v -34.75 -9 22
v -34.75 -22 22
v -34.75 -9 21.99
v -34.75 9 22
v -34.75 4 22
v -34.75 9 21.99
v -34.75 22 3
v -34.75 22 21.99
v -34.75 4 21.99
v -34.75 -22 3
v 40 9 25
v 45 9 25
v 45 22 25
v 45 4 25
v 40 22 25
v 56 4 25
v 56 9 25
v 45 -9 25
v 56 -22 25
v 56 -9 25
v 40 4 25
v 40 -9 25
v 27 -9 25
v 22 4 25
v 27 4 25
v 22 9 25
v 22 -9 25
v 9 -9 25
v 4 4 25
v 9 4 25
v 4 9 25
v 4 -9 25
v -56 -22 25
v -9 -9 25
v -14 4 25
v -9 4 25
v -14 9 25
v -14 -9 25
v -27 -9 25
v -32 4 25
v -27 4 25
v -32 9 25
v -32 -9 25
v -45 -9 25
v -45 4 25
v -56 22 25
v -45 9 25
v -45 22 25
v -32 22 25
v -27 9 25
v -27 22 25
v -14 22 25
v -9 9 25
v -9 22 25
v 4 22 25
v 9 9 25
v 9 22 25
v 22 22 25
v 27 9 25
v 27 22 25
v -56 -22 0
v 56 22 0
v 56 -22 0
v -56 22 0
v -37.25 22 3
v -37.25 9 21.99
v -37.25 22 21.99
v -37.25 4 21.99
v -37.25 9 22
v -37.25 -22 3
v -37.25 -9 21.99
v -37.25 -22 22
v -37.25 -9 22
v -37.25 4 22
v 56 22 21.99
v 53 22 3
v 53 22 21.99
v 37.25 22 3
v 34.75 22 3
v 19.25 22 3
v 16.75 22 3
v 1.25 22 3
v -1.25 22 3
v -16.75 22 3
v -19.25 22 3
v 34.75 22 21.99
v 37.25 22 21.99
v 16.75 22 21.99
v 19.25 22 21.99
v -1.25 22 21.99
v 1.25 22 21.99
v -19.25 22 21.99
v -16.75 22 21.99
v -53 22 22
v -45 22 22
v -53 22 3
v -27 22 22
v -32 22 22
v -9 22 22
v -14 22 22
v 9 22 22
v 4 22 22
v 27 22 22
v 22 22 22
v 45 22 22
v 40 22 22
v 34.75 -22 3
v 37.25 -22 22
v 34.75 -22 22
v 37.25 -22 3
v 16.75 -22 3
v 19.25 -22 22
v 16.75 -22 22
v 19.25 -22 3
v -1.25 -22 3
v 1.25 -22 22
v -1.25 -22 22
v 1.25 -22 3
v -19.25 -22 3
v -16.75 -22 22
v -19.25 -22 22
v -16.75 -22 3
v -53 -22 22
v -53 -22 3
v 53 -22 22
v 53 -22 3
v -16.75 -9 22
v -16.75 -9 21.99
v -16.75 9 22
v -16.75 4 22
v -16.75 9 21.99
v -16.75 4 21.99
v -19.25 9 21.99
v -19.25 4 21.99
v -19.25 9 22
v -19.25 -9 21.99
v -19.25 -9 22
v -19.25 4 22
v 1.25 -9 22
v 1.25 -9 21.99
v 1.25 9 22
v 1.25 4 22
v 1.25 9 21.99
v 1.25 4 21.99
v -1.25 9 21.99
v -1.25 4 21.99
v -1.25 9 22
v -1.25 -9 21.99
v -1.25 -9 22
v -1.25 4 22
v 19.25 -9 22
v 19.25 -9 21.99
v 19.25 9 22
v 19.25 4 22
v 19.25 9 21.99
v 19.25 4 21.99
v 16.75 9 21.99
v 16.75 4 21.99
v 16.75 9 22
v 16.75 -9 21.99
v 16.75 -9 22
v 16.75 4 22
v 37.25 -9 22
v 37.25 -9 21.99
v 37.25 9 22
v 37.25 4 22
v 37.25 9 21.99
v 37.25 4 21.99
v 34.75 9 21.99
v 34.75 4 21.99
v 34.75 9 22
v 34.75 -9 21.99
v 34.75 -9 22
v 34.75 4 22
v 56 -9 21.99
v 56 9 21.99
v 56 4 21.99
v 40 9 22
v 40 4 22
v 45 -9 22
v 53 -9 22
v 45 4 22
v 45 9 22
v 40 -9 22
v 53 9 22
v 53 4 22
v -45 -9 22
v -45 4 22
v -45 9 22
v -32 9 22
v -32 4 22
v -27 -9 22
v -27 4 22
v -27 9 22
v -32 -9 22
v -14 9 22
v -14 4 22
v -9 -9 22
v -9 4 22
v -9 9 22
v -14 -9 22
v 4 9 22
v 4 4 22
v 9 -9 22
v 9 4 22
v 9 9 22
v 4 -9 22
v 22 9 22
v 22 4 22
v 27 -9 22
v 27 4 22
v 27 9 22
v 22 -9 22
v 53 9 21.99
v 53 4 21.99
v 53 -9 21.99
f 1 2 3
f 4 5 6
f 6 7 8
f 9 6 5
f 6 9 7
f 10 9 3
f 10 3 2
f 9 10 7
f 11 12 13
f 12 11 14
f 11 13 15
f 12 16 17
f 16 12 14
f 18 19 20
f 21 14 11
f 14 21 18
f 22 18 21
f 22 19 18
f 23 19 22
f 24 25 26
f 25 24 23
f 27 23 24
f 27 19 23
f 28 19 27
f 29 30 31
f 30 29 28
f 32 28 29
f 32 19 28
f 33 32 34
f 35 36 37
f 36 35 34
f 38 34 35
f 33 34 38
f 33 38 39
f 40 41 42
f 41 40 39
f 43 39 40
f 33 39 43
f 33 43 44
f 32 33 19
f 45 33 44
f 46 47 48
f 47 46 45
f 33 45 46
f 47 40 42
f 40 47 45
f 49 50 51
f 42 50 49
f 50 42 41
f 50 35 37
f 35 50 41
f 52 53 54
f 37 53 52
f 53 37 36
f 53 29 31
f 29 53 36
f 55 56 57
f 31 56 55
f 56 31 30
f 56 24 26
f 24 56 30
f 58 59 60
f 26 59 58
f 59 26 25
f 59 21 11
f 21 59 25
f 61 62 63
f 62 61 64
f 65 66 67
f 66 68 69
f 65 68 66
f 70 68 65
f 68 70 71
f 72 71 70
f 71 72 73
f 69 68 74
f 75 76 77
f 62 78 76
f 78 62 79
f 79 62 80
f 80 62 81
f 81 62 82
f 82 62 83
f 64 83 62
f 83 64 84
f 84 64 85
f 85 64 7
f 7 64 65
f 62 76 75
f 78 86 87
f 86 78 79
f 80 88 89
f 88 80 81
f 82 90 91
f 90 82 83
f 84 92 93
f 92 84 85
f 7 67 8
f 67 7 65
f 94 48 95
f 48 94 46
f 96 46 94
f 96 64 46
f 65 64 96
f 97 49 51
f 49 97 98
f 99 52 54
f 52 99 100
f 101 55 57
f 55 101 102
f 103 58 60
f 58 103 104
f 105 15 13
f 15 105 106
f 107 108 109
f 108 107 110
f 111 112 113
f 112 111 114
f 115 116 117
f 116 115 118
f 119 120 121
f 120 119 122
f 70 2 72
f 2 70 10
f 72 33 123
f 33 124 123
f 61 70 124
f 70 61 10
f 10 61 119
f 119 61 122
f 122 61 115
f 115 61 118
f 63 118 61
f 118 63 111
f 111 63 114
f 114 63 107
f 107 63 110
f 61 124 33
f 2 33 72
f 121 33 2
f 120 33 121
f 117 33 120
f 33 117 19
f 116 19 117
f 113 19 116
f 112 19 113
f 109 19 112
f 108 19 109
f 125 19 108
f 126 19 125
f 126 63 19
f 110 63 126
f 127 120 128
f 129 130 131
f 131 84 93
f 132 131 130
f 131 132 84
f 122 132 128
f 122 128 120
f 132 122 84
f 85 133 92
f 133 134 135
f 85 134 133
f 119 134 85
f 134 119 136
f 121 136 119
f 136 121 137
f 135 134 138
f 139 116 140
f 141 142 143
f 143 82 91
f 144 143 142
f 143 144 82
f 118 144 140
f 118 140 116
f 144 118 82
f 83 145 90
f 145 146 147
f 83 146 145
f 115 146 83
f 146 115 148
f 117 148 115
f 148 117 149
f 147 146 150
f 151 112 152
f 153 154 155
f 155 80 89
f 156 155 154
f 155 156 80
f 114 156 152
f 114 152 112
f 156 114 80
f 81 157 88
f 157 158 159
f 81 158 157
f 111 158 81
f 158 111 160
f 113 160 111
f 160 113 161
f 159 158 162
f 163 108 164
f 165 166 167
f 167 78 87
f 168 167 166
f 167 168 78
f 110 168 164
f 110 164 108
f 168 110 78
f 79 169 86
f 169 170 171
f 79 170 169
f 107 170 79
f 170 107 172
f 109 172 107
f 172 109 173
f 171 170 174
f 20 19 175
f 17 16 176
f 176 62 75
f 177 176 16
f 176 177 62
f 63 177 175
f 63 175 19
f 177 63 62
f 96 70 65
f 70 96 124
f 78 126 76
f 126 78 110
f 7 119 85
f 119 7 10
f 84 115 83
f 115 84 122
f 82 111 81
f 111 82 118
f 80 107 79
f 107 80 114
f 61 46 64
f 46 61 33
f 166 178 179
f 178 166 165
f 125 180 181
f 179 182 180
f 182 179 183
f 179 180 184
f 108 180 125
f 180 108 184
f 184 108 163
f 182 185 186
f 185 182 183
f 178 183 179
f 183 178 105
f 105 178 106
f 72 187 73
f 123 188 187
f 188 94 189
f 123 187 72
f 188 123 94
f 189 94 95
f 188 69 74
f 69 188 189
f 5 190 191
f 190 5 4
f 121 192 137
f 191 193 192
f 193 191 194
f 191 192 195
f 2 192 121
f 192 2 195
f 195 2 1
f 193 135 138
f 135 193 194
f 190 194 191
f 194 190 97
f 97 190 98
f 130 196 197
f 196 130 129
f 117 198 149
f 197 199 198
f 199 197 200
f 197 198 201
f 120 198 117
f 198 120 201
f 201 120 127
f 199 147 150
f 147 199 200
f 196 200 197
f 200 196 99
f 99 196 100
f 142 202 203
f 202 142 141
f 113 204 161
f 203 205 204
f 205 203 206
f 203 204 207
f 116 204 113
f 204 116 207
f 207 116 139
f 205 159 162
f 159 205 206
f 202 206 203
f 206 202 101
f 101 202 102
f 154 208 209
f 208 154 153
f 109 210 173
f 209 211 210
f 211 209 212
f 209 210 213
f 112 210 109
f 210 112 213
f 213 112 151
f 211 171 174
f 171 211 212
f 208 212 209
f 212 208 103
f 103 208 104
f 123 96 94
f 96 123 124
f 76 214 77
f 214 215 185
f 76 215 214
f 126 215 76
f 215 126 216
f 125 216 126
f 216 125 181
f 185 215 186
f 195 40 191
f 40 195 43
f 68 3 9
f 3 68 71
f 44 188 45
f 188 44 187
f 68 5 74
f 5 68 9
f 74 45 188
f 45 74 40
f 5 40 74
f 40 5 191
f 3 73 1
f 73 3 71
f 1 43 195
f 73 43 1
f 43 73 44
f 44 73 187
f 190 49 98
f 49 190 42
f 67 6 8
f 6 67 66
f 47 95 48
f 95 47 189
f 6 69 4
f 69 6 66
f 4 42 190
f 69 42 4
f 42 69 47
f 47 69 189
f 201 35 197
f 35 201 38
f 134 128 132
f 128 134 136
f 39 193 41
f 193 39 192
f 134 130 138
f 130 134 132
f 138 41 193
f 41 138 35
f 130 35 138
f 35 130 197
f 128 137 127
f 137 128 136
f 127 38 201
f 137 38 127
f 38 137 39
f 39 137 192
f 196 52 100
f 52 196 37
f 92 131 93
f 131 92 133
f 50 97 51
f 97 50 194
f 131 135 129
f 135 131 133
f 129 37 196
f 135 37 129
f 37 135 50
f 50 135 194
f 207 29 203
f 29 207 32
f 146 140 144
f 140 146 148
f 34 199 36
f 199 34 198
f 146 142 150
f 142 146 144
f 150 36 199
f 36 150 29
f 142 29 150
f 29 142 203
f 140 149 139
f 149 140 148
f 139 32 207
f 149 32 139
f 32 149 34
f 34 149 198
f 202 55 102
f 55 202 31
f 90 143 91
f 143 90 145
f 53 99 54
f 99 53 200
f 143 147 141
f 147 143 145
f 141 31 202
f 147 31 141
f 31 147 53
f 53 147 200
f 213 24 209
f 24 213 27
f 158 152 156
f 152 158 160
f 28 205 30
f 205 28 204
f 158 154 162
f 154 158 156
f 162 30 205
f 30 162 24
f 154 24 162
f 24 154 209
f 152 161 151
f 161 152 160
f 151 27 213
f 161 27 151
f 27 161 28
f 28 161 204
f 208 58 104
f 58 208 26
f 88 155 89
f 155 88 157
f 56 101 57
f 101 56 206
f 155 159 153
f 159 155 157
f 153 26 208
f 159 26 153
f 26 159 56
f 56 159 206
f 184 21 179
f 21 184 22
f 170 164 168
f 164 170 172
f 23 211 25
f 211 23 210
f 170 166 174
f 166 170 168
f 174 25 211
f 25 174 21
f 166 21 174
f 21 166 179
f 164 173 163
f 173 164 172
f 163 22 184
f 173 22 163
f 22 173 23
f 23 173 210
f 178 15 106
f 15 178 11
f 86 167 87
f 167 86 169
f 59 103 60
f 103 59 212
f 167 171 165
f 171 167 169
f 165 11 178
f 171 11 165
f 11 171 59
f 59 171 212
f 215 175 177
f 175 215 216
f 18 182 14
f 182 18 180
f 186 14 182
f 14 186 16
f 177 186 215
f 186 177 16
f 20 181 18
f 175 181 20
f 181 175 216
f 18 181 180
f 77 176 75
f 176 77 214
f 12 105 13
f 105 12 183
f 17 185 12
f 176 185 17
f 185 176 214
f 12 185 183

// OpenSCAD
// --- Dimensions ---
base_width_x = 112;          // X dimension of base and deck
base_depth_y = 44;           // Y dimension of base and deck
base_thickness = 3;          // Thickness of base plate
deck_z_start = 22;           // Z position where deck starts
deck_thickness = 3;          // Thickness of deck plate
total_height = 25;           // Total height of the rack

wall_end_thickness = 3;       // Thickness of the two end walls
wall_rib_thickness = 2.5;     // Thickness of the five internal ribs
wall_depth = 44;             // Depth of the walls (Y direction)

// Hole dimensions
hole_size = 13;              // Size of the square cuvette holes
hole_spacing_x = 18;         // Center-to-center spacing X
hole_spacing_y = 18;         // Center-to-center spacing Y
holes_per_row = 6;           // Number of holes along X
rows = 2;                    // Number of rows along Y

// --- Constants ---
$fn = 64;

// --- Helper Modules ---

// Module to create the main structural body
module rack_structure() {
    union() {
        // Base Plate
        translate([-base_width_x/2, -base_depth_y/2, 0])
            cube([base_width_x, base_depth_y, base_thickness]);
        
        // Deck Plate
        translate([-base_width_x/2, -base_depth_y/2, deck_z_start])
            cube([base_width_x, base_depth_y, deck_thickness]);
        
        // End Walls (Flush with short ends)
        // Left Wall
        translate([-base_width_x/2, -base_depth_y/2, 0])
            cube([wall_end_thickness, base_depth_y, total_height]);
        // Right Wall
        translate([base_width_x/2 - wall_end_thickness, -base_depth_y/2, 0])
            cube([wall_end_thickness, base_depth_y, total_height]);
            
        // Internal Ribs
        // Rib positions provided: -36, -18, 0, 18, 36
        for (rx = [-36, -18, 0, 18, 36]) {
            translate([rx - wall_rib_thickness/2, -base_depth_y/2, 0])
                cube([wall_rib_thickness, base_depth_y, total_height]);
        }
    }
}

// Module to create the holes to be subtracted
module holes_to_cut() {
    // Calculate starting offsets to ensure the grid is centered on the deck
    // The grid is 5 intervals of 18mm = 90mm total span.
    // The deck is 112mm. Offset = (112 - 90)/2 = 11.
    // However, the prompt says "18mm centre-to-center and centred on the deck".
    // We will calculate the center of the deck and place holes around it.
    
    for (i = [0 : holes_per_row - 1]) {
        for (j = [0 : rows - 1]) {
            // Calculate X position: center of deck + (i - (count-1)/2) * spacing
            x_pos = (i - (holes_per_row - 1) / 2.0) * hole_spacing_x;
            // Calculate Y position: center of deck + (j - (count-1)/2) * spacing
            y_pos = (j - (rows - 1) / 2.0) * hole_spacing_y;
            
            translate([x_pos, y_pos, deck_z_start - 0.01])
                cube([hole_size, hole_size, deck_thickness + 0.02]);
        }
    }
}

// --- Final Assembly ---

difference() {
    // The solid part
    rack_structure();
    
    // The holes cut through the deck
    holes_to_cut();
}
